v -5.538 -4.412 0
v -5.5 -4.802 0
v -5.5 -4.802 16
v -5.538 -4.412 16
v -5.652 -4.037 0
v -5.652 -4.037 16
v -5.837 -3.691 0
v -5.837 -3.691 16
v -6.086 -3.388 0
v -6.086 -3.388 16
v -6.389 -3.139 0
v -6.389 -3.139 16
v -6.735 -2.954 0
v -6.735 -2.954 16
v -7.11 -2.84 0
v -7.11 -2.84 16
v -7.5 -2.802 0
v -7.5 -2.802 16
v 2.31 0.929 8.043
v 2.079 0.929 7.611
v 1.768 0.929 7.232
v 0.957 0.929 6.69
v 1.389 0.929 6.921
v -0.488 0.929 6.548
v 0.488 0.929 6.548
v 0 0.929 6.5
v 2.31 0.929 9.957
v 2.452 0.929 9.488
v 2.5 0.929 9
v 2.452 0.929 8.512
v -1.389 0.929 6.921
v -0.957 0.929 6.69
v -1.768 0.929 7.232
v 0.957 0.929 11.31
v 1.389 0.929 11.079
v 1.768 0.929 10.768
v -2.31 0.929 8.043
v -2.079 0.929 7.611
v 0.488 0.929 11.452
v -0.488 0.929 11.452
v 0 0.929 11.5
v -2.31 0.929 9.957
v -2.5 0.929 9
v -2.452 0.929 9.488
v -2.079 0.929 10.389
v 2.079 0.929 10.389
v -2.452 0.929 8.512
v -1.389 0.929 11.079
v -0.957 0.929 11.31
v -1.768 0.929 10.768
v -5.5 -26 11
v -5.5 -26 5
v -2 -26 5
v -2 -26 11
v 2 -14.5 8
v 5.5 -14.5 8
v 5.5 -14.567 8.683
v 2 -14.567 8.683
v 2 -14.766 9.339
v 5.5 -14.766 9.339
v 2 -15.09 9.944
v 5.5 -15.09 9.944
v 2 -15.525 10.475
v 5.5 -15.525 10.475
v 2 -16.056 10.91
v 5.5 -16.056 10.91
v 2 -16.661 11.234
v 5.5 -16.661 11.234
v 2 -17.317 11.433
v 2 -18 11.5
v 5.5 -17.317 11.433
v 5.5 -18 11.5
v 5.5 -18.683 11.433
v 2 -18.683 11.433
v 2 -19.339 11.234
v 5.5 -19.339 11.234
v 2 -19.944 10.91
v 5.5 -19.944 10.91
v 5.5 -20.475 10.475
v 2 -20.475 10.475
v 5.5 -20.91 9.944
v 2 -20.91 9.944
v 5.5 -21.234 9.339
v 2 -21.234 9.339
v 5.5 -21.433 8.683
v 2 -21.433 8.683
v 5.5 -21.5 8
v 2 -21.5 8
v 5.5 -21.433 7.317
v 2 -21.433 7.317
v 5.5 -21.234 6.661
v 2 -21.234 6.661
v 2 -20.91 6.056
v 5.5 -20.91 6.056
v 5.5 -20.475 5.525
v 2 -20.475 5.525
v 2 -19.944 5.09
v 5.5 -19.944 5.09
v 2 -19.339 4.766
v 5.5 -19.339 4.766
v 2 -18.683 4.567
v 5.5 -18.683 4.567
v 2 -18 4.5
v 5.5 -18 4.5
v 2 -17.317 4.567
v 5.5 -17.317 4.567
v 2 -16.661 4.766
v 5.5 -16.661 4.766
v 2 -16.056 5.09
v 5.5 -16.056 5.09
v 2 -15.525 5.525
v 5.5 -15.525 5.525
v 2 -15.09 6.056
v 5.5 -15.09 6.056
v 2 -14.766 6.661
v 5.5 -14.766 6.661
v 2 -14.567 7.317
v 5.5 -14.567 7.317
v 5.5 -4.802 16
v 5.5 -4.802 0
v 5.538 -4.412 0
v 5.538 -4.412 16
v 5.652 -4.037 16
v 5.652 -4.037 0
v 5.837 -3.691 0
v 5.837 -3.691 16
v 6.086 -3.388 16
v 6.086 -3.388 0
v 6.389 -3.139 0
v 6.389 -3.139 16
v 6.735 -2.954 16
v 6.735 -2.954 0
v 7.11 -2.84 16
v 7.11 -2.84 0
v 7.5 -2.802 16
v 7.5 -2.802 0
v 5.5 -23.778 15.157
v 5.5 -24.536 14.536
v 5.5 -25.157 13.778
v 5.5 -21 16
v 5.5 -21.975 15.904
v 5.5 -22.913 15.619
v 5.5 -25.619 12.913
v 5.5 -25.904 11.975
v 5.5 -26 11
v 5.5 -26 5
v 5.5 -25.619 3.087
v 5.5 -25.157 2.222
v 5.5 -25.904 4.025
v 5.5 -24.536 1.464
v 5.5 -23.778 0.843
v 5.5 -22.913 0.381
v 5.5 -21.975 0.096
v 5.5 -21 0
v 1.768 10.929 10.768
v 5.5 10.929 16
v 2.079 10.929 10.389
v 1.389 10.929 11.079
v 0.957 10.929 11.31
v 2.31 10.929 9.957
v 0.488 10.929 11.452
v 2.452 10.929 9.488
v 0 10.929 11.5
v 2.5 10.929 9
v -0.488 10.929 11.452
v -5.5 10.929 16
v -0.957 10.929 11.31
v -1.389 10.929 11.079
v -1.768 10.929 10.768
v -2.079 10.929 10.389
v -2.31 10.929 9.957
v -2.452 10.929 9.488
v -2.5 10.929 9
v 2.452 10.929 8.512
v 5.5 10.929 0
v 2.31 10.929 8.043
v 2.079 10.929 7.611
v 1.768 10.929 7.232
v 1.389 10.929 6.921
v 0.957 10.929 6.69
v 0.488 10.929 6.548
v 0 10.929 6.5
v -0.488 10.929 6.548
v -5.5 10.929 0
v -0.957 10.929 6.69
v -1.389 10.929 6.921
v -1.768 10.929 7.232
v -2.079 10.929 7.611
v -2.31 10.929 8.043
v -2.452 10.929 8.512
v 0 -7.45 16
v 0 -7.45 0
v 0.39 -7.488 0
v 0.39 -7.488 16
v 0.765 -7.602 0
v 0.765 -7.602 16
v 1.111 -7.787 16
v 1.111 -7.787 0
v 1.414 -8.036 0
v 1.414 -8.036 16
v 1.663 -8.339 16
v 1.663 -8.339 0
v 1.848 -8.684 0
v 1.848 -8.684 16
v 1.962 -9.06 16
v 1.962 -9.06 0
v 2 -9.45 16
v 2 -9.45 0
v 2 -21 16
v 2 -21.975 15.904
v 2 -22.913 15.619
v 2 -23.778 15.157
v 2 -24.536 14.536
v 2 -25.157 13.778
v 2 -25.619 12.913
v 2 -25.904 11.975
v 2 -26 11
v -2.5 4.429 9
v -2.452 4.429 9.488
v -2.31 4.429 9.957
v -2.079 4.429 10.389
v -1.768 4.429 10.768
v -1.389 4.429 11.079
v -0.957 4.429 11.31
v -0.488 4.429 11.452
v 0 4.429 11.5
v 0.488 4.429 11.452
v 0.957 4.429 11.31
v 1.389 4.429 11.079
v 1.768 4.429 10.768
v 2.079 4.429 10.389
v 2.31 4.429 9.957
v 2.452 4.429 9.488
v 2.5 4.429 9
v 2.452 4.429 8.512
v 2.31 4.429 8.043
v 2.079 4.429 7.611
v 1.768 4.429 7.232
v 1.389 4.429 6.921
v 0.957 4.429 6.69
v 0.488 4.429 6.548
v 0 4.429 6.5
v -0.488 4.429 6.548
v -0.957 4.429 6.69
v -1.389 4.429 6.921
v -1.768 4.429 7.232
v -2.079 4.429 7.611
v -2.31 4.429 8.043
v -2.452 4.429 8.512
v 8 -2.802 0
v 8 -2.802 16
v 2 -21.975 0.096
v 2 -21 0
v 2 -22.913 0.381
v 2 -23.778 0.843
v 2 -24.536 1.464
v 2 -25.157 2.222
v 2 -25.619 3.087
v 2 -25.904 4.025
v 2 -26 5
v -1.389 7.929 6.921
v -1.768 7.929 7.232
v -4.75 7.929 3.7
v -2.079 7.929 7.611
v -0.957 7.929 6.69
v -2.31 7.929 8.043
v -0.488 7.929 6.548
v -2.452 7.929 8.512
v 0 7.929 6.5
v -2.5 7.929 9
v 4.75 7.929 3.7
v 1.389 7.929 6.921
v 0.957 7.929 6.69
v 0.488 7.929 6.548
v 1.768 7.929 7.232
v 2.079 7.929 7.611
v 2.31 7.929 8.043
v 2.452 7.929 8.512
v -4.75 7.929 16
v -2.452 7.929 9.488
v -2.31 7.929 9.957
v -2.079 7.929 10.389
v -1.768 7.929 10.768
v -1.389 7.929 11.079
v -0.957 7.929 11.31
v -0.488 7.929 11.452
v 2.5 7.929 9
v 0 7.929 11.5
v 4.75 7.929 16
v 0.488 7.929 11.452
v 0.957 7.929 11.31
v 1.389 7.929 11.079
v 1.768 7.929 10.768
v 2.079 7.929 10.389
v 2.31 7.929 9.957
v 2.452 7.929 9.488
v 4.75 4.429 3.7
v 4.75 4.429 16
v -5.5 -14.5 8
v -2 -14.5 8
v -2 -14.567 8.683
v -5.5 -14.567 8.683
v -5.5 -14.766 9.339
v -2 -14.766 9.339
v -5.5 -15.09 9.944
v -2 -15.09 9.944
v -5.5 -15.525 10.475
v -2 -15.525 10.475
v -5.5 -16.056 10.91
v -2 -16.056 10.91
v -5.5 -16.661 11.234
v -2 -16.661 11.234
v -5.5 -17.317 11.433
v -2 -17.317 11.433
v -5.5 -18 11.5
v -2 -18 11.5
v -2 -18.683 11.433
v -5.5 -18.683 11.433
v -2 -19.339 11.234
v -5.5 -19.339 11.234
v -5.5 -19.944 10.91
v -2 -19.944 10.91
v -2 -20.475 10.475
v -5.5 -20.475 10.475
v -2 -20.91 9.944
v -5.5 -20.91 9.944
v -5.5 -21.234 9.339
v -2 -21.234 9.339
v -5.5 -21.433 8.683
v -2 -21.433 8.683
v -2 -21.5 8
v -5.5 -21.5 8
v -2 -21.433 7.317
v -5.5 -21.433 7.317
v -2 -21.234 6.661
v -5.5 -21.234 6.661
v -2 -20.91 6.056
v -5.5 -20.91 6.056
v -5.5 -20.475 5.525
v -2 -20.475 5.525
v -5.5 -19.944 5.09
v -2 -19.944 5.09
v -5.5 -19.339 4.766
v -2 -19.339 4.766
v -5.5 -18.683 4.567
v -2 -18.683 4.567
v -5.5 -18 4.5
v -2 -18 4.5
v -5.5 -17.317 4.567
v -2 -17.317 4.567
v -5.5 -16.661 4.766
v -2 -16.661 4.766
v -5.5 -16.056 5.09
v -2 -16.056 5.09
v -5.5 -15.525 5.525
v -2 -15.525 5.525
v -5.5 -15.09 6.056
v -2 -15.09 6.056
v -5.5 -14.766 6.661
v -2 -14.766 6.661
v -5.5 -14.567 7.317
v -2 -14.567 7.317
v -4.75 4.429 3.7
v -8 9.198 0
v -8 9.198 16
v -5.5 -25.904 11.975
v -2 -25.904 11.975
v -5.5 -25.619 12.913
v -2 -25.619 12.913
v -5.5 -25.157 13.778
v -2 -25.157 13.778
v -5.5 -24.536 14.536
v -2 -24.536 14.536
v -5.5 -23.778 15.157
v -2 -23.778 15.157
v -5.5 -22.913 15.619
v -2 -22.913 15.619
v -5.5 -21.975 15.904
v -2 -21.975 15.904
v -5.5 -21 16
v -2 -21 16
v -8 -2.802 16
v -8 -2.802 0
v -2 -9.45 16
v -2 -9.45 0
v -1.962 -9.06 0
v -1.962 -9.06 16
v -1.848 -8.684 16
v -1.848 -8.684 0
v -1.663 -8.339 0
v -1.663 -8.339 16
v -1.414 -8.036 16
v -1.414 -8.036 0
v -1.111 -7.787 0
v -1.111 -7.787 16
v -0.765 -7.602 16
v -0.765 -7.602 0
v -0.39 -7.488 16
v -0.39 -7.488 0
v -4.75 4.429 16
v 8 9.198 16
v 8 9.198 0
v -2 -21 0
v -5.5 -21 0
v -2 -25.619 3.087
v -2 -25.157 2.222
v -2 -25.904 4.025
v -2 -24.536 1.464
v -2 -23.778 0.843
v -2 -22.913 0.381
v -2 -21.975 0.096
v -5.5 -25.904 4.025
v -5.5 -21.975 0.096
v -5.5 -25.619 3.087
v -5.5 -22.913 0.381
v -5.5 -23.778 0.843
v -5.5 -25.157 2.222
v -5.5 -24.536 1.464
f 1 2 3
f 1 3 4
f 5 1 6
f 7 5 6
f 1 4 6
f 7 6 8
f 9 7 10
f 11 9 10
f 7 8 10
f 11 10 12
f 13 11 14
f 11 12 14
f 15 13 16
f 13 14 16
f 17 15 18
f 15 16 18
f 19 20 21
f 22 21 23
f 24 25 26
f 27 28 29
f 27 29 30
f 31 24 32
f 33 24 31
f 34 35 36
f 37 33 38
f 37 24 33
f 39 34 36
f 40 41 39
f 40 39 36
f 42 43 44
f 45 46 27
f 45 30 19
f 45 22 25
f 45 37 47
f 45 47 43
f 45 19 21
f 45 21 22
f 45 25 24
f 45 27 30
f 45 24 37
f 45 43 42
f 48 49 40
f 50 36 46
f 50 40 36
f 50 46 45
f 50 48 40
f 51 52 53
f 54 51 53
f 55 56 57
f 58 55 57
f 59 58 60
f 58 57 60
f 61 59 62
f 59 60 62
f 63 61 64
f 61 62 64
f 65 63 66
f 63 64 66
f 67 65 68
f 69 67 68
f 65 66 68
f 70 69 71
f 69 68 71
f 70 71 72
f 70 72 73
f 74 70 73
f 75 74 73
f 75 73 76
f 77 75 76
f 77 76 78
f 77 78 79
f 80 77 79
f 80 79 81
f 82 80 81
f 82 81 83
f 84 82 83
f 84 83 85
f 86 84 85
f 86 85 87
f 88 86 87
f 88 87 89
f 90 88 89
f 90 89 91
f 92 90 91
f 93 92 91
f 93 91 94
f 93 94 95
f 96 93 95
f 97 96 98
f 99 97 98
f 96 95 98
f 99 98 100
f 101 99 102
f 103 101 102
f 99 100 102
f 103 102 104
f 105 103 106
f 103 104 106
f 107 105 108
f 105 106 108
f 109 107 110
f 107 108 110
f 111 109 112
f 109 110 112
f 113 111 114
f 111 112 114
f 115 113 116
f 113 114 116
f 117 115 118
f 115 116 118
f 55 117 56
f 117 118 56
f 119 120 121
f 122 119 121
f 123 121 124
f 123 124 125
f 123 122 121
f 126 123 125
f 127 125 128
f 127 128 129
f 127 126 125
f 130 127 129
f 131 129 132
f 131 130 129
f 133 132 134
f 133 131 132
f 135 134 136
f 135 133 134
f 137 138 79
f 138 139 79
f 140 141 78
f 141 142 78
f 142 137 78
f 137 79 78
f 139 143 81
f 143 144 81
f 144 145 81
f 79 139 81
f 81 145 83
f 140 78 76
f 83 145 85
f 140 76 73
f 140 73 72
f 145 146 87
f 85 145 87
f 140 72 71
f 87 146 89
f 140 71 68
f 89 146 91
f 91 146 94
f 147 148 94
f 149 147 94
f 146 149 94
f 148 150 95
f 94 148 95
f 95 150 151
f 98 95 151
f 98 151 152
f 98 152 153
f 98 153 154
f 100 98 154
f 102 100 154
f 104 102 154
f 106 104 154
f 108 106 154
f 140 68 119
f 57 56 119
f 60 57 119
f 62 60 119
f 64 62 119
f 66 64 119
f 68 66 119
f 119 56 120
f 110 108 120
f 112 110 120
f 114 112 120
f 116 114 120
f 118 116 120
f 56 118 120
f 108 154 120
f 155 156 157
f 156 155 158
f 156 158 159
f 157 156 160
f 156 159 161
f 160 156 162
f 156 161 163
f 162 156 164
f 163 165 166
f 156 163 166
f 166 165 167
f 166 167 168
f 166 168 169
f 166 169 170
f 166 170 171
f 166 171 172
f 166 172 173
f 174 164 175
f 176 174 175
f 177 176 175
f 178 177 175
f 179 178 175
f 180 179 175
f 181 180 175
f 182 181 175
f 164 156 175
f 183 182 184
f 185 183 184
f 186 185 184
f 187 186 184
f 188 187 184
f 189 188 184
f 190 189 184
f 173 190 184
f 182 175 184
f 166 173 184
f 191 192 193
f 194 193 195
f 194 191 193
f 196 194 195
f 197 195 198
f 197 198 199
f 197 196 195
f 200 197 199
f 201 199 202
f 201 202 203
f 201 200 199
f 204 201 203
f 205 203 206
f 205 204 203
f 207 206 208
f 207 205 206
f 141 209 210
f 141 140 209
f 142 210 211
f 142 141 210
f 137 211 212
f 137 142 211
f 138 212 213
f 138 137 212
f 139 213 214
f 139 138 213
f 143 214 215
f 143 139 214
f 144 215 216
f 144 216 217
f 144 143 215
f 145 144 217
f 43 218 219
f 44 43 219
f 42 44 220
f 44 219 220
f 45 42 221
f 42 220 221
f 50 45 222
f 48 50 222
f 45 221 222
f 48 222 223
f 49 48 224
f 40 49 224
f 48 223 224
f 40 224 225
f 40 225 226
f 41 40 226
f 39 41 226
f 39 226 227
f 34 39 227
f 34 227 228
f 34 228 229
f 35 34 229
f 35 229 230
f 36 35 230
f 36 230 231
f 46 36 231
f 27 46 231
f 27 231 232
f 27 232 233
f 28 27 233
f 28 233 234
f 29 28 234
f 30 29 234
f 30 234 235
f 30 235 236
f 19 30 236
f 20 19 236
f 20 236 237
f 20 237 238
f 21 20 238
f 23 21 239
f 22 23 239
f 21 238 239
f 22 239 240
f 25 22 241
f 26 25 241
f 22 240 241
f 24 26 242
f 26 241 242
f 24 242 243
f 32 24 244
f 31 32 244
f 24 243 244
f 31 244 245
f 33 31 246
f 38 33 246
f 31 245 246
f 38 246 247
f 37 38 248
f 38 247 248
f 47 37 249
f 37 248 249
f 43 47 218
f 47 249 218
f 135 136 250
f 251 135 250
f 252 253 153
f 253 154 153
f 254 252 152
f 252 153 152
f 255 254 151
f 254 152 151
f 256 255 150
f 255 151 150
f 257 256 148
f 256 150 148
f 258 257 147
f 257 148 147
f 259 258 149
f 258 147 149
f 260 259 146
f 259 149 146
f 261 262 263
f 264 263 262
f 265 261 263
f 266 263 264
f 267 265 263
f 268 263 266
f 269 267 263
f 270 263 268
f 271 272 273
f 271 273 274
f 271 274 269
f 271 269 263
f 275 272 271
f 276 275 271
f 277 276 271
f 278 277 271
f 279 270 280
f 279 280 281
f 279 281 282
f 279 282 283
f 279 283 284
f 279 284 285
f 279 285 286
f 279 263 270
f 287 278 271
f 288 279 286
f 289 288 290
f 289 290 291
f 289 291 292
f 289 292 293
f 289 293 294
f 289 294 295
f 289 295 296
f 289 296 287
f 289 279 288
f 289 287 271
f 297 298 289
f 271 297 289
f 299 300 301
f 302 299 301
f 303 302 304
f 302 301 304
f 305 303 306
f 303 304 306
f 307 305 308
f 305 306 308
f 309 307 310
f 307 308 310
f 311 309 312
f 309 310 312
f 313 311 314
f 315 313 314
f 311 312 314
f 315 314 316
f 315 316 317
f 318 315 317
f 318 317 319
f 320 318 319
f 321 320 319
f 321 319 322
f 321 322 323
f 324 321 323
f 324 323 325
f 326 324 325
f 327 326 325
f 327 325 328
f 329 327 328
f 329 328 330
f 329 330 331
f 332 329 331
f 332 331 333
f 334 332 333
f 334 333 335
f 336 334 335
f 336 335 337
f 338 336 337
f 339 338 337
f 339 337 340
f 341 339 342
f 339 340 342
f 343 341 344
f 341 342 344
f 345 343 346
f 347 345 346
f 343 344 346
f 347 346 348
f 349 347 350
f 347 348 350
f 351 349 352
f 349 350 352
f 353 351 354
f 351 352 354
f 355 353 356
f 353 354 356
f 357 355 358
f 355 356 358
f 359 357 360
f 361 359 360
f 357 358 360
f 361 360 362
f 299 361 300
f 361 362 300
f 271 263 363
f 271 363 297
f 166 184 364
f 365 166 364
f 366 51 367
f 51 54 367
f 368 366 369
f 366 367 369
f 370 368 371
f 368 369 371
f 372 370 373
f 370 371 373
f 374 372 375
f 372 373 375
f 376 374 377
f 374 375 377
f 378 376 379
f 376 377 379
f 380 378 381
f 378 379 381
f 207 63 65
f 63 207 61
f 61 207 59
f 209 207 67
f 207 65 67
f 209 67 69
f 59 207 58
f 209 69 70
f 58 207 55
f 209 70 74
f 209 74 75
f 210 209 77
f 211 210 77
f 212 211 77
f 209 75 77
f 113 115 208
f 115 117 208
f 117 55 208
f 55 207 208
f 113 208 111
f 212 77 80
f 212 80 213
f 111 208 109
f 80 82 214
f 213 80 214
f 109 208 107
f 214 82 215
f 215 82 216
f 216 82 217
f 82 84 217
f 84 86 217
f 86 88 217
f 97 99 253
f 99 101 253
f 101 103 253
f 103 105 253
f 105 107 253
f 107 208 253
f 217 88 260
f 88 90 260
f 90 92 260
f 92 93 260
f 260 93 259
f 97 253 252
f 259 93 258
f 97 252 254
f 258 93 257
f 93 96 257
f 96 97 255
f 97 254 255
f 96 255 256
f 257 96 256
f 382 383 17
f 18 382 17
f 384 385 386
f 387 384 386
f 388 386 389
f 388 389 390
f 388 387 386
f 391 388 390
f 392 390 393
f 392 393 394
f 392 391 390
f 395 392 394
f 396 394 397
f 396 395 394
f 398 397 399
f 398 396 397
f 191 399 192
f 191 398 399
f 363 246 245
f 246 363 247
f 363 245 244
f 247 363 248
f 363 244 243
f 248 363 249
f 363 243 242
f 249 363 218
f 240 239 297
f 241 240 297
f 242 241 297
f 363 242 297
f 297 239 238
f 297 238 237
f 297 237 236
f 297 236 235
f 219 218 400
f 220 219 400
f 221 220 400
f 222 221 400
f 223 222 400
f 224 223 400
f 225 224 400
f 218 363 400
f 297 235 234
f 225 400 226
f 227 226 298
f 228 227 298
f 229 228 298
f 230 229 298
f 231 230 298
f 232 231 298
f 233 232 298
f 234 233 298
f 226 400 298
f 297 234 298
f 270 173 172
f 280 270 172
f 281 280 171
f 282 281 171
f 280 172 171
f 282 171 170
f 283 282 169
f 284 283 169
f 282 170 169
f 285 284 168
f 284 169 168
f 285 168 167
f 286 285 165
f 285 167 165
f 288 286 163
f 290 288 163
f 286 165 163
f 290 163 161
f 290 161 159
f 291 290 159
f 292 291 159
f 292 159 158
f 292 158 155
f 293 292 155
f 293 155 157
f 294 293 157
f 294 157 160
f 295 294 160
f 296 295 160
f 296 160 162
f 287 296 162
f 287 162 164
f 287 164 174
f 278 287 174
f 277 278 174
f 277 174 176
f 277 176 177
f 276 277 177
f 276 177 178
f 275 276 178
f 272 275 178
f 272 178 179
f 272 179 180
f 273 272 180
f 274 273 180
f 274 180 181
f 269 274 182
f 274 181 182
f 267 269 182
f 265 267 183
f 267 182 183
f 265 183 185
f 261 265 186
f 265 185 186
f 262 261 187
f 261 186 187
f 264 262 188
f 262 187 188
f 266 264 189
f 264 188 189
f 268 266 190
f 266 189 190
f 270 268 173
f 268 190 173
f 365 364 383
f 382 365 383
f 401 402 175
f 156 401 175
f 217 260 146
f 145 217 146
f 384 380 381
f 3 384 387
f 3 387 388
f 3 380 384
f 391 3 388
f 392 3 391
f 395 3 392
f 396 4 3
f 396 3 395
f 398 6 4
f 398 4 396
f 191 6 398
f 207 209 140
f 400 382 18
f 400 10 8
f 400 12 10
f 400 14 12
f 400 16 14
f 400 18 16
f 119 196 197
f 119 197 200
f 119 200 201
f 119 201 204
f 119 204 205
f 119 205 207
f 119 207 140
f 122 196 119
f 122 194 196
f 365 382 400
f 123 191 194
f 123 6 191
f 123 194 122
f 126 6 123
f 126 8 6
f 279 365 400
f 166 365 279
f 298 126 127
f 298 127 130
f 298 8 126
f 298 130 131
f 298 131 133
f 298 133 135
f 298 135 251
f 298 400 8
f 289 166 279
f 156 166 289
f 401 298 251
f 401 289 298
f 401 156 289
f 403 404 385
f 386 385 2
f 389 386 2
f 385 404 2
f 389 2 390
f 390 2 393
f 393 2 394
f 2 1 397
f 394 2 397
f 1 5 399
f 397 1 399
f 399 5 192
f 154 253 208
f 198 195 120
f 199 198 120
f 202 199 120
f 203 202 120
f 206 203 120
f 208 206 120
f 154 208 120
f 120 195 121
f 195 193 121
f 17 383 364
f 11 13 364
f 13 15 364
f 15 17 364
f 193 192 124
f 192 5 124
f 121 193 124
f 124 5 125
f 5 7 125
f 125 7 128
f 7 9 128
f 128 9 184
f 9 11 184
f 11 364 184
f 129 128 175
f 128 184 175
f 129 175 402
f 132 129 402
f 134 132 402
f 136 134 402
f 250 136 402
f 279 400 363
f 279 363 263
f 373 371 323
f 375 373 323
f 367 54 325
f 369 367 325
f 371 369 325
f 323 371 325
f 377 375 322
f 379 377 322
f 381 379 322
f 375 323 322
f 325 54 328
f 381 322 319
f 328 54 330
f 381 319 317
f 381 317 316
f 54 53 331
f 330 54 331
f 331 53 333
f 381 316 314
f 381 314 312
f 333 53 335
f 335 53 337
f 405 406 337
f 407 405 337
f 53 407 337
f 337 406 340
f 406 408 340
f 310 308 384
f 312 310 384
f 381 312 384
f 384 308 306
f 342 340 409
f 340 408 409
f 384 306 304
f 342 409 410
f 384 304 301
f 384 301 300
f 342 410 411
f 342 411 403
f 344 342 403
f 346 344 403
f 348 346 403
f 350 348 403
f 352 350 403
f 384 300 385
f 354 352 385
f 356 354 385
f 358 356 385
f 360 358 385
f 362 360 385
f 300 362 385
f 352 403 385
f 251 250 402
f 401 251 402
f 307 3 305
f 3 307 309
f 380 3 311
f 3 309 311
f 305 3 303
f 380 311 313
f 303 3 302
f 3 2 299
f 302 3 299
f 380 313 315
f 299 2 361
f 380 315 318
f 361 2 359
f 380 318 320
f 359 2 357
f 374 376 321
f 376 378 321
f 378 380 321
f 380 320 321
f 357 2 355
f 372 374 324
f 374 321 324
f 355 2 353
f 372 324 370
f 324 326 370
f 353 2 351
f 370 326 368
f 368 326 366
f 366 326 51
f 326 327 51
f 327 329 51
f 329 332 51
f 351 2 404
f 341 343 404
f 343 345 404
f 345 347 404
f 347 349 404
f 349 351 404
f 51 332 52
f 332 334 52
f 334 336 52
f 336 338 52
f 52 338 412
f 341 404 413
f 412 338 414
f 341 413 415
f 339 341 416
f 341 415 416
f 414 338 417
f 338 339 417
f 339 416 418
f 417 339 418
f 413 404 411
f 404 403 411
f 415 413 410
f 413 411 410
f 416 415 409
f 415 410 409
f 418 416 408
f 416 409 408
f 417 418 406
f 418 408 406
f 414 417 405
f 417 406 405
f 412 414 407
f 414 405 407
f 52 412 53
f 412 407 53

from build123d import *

# Parameters (mm, degrees)
F1_DEPTH = 16
F2_R     = 2.5
F3_DEPTH = 10
F4_R     = 3.5
F5_DEPTH = 11
F6_R     = 1.99999
F7_W     = 9.5
F7_H     = 3.5
F8_DEPTH = 12.3
F9_R     = 5


# Not quite as in the source:
# - a fillet or chamfer is up to 0.001 mm smaller than in the source, because OpenCascade refuses the exact size


with BuildPart() as f1:
    # F0 (on Top) → F1 (new body)
    with BuildSketch(Plane.XY):
        Polygon((-5.5, -2.8019716907), (-5.5, -26), (-2, -26), (-2, -7.4497503303), (2, -7.4497503303), (2, -26), (5.5, -26), (5.5, -2.8019716907), (8, -2.8019716907), (8, 9.1980283093), (5.5, 10.9290892892), (-5.5, 10.9290892892), (-8, 9.1980283093), (-8, -2.8019716907), align=None)
    extrude(amount=F1_DEPTH)

    # F2 (on face) → F3 (cut)
    with BuildSketch(Plane(origin=(0, 10.9290892892, 0), x_dir=(-1, 0, 0), z_dir=(0, 1, 0))):
        with Locations((0, 9)):
            Circle(F2_R)
    extrude(amount=-F3_DEPTH, mode=Mode.SUBTRACT)

    # F4 (on face) → F5 (cut, through all)
    with BuildSketch(Plane.YZ.offset(5.5)):
        with Locations((-18, 8)):
            Circle(F4_R)
    extrude(amount=-F5_DEPTH, mode=Mode.SUBTRACT)

    # F6 (radius 2 in the source; OpenCascade refuses exactly that, so slightly less here)
    f6_edges = [f1.edges().sort_by_distance(p)[0] for p in [
        (-5.5, -2.801972, 8),
        (2, -7.44975, 8),
        (-2, -7.44975, 8),
        (5.5, -2.801972, 8),
    ]]
    fillet(f6_edges, radius=F6_R)

    # F7 (on face) → F8 (cut)
    with BuildSketch(Plane.XY.offset(16)):
        with Locations((0, 6.1790892892)):
            Rectangle(F7_W, F7_H)
    extrude(amount=-F8_DEPTH, mode=Mode.SUBTRACT)

    # F9
    f9_edges = [f1.edges().sort_by_distance(p)[0] for p in [
        (3.75, -26, 16),
        (3.75, -26, 0),
        (-3.75, -26, 16),
        (-3.75, -26, 0),
    ]]
    fillet(f9_edges, radius=F9_R)


solid = f1.part
